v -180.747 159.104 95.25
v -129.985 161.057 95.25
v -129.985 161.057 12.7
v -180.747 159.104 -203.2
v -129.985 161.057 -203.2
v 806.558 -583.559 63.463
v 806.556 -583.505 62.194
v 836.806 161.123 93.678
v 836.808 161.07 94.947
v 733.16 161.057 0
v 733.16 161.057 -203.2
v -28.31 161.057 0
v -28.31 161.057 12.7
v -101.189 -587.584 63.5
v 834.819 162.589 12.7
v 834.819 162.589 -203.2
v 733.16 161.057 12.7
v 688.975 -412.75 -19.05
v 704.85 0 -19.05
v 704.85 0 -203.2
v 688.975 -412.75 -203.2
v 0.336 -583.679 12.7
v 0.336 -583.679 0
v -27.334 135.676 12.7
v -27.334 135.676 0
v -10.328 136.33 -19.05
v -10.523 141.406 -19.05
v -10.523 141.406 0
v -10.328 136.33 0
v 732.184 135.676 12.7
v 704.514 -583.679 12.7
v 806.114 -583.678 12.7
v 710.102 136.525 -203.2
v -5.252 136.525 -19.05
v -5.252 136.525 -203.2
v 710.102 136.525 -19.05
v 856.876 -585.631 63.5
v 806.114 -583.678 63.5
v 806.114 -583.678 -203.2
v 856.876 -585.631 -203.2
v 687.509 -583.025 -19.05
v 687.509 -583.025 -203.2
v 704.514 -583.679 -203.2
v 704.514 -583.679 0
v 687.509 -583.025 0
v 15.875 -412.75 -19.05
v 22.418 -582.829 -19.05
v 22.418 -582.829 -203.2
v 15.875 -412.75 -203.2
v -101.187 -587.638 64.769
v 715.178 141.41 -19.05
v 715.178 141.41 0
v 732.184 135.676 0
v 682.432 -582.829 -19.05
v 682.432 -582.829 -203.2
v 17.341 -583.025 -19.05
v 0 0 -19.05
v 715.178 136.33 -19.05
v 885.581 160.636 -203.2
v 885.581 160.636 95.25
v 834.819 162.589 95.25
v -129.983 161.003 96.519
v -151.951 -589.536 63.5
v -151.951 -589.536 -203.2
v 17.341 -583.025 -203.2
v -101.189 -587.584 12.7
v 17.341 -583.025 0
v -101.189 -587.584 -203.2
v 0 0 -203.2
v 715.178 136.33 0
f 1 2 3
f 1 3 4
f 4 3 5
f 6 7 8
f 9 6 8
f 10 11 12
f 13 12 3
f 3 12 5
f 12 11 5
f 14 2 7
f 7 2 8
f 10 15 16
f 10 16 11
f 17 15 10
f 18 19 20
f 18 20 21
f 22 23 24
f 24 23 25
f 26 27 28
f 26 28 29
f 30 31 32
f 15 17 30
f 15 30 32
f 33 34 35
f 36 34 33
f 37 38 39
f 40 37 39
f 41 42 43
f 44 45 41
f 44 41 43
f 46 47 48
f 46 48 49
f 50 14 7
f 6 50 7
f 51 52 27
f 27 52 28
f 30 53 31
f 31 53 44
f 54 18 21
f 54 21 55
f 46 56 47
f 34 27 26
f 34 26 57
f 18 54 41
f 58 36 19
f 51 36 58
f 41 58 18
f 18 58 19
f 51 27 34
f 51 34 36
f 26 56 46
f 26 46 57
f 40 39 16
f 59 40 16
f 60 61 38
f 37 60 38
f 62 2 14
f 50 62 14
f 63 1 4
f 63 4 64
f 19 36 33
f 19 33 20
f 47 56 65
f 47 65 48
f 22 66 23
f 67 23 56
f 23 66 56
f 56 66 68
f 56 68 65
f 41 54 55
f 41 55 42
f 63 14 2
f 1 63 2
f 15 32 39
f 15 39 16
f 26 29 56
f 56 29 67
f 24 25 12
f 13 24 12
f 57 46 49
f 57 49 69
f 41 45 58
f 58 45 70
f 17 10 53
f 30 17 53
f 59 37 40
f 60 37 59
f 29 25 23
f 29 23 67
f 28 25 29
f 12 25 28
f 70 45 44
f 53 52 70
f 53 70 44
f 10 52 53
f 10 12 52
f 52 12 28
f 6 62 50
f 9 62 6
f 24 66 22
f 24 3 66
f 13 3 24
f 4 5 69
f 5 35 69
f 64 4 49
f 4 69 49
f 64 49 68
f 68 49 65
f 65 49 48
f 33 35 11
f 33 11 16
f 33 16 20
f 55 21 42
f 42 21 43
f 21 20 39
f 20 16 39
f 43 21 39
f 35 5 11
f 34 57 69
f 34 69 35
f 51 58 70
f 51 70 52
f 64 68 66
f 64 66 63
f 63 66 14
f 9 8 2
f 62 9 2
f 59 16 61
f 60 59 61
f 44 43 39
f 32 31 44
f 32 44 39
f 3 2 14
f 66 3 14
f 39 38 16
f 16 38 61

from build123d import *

# Parameters (mm, degrees)
F1_DEPTH = 203.2
F2_DEPTH = 12.7
F3_DEPTH = 19.05
F4_W     = 746.8187077512
F4_H     = 215.9
F5_DEPTH = 50.8
F7_DEPTH = 50.8
F9_DEPTH = 1.27


with BuildPart() as f1:
    # F0 (on Top) → F1 (new body)
    with BuildSketch(Plane.XY):
        Polygon((-101.188883044, -587.583909848), (0.3360406256, -583.6788011578), (-27.333590572, 135.6756184324), (-28.3098677445, 161.0568493498), (-129.9849995929, 161.0568493498), align=None)
        Polygon((0.3360406256, -583.6788011578), (17.3414653403, -583.0246954522), (-10.3281658573, 136.329724138), (-27.333590572, 135.6756184324), align=None)
        Polygon((17.3414653403, -583.0246954522), (22.417710738, -582.8294195902), (15.875, -412.75), (0, 0), (-5.2519204596, 136.525), (-10.3281658573, 136.329724138), align=None)
        Polygon((704.85, 136.525), (710.1019204596, 136.525), (715.1781658573, 136.329724138), (715.1781658573, 141.409724138), (-10.5234417193, 141.4059695357), (-10.3281658573, 136.329724138), (-5.2519204596, 136.525), align=None)
        Polygon((715.1781658573, 141.409724138), (715.1781658573, 136.329724138), (732.183590572, 135.6756184324), (733.1598677445, 161.0568493498), (-28.3098677445, 161.0568493498), (-27.333590572, 135.6756184324), (-10.3281658573, 136.329724138), (-10.5234417193, 141.4059695357), align=None)
        Polygon((732.183590572, 135.6756184324), (704.5139593744, -583.6788011578), (806.113959373, -583.6782755043), (834.8187647438, 162.5885778369), (733.1598677445, 161.0568493498), align=None)
        Polygon((715.1781658573, 136.329724138), (687.5085346597, -583.0246954522), (704.5139593744, -583.6788011578), (732.183590572, 135.6756184324), align=None)
        Polygon((704.85, 0), (688.975, -412.75), (682.432289262, -582.8294195902), (687.5085346597, -583.0246954522), (715.1781658573, 136.329724138), (710.1019204596, 136.525), align=None)
    extrude(amount=-F1_DEPTH)

    # F0 (on Top) → F2 (join)
    with BuildSketch(Plane.XY):
        Polygon((-101.188883044, -587.583909848), (0.3360406256, -583.6788011578), (-27.333590572, 135.6756184324), (-28.3098677445, 161.0568493498), (-129.9849995929, 161.0568493498), align=None)
        Polygon((732.183590572, 135.6756184324), (704.5139593744, -583.6788011578), (806.113959373, -583.6782755043), (834.8187647438, 162.5885778369), (733.1598677445, 161.0568493498), align=None)
    extrude(amount=F2_DEPTH)

    # F0 (on Top) → F3 (cut)
    with BuildSketch(Plane.XY):
        Polygon((17.3414653403, -583.0246954522), (22.417710738, -582.8294195902), (15.875, -412.75), (0, 0), (-5.2519204596, 136.525), (-10.3281658573, 136.329724138), align=None)
        Polygon((704.85, 0), (688.975, -412.75), (682.432289262, -582.8294195902), (687.5085346597, -583.0246954522), (715.1781658573, 136.329724138), (710.1019204596, 136.525), align=None)
        Polygon((704.85, 136.525), (710.1019204596, 136.525), (715.1781658573, 136.329724138), (715.1781658573, 141.409724138), (-10.5234417193, 141.4059695357), (-10.3281658573, 136.329724138), (-5.2519204596, 136.525), align=None)
    extrude(amount=-F3_DEPTH, mode=Mode.SUBTRACT)

    # F6 (on face) → F7 (join)
    with BuildSketch(Plane(origin=(-123.6071439631, -4.7544909626, 0), x_dir=(0.0384361092, -0.9992610597, 0), z_dir=(-0.9992610597, -0.0384361092, 0))):
        Polygon((-165.9339555926, 95.25), (-165.9339555926, 12.7), (-165.9339555926, -203.2), (583.2604134869, -203.2), (583.2604134869, 12.7), (583.2604134869, 63.5), align=None)
    extrude(amount=F7_DEPTH)


with BuildPart() as f5:
    # F4 (on face) → F5 (new body)
    with BuildSketch(Plane(origin=(827.3408037059, -31.8232769409, 0), x_dir=(0.0384361092, 0.9992610597, 0), z_dir=(0.9992610597, -0.0384361092, 0))):
        Polygon((-552.2630879931, 63.5), (-552.2630879931, 12.7), (194.555619758, 12.7), (194.555619758, 95.25), align=None)
        with Locations((-178.8537341176, -95.25)):
            Rectangle(F4_W, F4_H)
    extrude(amount=F5_DEPTH)


with BuildPart() as f9:
    # F8 (on face) → F9 (new body)
    with BuildSketch(Plane(origin=(0.1434386281, -3.7291140724, 88.0597564011), x_dir=(0.9999986758, 6.88554e-05, -0.0016259603), z_dir=(0.0016274176, -0.0423095639, 0.9991032241))):
        Polygon((836.6636633873, 164.9426218293), (-130.1286105432, 164.9426218293), (-101.3324558611, -584.3710952719), (806.413769722, -580.3514122963), align=None)
    extrude(amount=F9_DEPTH)


solid = Compound([f1.part, f5.part, f9.part])
